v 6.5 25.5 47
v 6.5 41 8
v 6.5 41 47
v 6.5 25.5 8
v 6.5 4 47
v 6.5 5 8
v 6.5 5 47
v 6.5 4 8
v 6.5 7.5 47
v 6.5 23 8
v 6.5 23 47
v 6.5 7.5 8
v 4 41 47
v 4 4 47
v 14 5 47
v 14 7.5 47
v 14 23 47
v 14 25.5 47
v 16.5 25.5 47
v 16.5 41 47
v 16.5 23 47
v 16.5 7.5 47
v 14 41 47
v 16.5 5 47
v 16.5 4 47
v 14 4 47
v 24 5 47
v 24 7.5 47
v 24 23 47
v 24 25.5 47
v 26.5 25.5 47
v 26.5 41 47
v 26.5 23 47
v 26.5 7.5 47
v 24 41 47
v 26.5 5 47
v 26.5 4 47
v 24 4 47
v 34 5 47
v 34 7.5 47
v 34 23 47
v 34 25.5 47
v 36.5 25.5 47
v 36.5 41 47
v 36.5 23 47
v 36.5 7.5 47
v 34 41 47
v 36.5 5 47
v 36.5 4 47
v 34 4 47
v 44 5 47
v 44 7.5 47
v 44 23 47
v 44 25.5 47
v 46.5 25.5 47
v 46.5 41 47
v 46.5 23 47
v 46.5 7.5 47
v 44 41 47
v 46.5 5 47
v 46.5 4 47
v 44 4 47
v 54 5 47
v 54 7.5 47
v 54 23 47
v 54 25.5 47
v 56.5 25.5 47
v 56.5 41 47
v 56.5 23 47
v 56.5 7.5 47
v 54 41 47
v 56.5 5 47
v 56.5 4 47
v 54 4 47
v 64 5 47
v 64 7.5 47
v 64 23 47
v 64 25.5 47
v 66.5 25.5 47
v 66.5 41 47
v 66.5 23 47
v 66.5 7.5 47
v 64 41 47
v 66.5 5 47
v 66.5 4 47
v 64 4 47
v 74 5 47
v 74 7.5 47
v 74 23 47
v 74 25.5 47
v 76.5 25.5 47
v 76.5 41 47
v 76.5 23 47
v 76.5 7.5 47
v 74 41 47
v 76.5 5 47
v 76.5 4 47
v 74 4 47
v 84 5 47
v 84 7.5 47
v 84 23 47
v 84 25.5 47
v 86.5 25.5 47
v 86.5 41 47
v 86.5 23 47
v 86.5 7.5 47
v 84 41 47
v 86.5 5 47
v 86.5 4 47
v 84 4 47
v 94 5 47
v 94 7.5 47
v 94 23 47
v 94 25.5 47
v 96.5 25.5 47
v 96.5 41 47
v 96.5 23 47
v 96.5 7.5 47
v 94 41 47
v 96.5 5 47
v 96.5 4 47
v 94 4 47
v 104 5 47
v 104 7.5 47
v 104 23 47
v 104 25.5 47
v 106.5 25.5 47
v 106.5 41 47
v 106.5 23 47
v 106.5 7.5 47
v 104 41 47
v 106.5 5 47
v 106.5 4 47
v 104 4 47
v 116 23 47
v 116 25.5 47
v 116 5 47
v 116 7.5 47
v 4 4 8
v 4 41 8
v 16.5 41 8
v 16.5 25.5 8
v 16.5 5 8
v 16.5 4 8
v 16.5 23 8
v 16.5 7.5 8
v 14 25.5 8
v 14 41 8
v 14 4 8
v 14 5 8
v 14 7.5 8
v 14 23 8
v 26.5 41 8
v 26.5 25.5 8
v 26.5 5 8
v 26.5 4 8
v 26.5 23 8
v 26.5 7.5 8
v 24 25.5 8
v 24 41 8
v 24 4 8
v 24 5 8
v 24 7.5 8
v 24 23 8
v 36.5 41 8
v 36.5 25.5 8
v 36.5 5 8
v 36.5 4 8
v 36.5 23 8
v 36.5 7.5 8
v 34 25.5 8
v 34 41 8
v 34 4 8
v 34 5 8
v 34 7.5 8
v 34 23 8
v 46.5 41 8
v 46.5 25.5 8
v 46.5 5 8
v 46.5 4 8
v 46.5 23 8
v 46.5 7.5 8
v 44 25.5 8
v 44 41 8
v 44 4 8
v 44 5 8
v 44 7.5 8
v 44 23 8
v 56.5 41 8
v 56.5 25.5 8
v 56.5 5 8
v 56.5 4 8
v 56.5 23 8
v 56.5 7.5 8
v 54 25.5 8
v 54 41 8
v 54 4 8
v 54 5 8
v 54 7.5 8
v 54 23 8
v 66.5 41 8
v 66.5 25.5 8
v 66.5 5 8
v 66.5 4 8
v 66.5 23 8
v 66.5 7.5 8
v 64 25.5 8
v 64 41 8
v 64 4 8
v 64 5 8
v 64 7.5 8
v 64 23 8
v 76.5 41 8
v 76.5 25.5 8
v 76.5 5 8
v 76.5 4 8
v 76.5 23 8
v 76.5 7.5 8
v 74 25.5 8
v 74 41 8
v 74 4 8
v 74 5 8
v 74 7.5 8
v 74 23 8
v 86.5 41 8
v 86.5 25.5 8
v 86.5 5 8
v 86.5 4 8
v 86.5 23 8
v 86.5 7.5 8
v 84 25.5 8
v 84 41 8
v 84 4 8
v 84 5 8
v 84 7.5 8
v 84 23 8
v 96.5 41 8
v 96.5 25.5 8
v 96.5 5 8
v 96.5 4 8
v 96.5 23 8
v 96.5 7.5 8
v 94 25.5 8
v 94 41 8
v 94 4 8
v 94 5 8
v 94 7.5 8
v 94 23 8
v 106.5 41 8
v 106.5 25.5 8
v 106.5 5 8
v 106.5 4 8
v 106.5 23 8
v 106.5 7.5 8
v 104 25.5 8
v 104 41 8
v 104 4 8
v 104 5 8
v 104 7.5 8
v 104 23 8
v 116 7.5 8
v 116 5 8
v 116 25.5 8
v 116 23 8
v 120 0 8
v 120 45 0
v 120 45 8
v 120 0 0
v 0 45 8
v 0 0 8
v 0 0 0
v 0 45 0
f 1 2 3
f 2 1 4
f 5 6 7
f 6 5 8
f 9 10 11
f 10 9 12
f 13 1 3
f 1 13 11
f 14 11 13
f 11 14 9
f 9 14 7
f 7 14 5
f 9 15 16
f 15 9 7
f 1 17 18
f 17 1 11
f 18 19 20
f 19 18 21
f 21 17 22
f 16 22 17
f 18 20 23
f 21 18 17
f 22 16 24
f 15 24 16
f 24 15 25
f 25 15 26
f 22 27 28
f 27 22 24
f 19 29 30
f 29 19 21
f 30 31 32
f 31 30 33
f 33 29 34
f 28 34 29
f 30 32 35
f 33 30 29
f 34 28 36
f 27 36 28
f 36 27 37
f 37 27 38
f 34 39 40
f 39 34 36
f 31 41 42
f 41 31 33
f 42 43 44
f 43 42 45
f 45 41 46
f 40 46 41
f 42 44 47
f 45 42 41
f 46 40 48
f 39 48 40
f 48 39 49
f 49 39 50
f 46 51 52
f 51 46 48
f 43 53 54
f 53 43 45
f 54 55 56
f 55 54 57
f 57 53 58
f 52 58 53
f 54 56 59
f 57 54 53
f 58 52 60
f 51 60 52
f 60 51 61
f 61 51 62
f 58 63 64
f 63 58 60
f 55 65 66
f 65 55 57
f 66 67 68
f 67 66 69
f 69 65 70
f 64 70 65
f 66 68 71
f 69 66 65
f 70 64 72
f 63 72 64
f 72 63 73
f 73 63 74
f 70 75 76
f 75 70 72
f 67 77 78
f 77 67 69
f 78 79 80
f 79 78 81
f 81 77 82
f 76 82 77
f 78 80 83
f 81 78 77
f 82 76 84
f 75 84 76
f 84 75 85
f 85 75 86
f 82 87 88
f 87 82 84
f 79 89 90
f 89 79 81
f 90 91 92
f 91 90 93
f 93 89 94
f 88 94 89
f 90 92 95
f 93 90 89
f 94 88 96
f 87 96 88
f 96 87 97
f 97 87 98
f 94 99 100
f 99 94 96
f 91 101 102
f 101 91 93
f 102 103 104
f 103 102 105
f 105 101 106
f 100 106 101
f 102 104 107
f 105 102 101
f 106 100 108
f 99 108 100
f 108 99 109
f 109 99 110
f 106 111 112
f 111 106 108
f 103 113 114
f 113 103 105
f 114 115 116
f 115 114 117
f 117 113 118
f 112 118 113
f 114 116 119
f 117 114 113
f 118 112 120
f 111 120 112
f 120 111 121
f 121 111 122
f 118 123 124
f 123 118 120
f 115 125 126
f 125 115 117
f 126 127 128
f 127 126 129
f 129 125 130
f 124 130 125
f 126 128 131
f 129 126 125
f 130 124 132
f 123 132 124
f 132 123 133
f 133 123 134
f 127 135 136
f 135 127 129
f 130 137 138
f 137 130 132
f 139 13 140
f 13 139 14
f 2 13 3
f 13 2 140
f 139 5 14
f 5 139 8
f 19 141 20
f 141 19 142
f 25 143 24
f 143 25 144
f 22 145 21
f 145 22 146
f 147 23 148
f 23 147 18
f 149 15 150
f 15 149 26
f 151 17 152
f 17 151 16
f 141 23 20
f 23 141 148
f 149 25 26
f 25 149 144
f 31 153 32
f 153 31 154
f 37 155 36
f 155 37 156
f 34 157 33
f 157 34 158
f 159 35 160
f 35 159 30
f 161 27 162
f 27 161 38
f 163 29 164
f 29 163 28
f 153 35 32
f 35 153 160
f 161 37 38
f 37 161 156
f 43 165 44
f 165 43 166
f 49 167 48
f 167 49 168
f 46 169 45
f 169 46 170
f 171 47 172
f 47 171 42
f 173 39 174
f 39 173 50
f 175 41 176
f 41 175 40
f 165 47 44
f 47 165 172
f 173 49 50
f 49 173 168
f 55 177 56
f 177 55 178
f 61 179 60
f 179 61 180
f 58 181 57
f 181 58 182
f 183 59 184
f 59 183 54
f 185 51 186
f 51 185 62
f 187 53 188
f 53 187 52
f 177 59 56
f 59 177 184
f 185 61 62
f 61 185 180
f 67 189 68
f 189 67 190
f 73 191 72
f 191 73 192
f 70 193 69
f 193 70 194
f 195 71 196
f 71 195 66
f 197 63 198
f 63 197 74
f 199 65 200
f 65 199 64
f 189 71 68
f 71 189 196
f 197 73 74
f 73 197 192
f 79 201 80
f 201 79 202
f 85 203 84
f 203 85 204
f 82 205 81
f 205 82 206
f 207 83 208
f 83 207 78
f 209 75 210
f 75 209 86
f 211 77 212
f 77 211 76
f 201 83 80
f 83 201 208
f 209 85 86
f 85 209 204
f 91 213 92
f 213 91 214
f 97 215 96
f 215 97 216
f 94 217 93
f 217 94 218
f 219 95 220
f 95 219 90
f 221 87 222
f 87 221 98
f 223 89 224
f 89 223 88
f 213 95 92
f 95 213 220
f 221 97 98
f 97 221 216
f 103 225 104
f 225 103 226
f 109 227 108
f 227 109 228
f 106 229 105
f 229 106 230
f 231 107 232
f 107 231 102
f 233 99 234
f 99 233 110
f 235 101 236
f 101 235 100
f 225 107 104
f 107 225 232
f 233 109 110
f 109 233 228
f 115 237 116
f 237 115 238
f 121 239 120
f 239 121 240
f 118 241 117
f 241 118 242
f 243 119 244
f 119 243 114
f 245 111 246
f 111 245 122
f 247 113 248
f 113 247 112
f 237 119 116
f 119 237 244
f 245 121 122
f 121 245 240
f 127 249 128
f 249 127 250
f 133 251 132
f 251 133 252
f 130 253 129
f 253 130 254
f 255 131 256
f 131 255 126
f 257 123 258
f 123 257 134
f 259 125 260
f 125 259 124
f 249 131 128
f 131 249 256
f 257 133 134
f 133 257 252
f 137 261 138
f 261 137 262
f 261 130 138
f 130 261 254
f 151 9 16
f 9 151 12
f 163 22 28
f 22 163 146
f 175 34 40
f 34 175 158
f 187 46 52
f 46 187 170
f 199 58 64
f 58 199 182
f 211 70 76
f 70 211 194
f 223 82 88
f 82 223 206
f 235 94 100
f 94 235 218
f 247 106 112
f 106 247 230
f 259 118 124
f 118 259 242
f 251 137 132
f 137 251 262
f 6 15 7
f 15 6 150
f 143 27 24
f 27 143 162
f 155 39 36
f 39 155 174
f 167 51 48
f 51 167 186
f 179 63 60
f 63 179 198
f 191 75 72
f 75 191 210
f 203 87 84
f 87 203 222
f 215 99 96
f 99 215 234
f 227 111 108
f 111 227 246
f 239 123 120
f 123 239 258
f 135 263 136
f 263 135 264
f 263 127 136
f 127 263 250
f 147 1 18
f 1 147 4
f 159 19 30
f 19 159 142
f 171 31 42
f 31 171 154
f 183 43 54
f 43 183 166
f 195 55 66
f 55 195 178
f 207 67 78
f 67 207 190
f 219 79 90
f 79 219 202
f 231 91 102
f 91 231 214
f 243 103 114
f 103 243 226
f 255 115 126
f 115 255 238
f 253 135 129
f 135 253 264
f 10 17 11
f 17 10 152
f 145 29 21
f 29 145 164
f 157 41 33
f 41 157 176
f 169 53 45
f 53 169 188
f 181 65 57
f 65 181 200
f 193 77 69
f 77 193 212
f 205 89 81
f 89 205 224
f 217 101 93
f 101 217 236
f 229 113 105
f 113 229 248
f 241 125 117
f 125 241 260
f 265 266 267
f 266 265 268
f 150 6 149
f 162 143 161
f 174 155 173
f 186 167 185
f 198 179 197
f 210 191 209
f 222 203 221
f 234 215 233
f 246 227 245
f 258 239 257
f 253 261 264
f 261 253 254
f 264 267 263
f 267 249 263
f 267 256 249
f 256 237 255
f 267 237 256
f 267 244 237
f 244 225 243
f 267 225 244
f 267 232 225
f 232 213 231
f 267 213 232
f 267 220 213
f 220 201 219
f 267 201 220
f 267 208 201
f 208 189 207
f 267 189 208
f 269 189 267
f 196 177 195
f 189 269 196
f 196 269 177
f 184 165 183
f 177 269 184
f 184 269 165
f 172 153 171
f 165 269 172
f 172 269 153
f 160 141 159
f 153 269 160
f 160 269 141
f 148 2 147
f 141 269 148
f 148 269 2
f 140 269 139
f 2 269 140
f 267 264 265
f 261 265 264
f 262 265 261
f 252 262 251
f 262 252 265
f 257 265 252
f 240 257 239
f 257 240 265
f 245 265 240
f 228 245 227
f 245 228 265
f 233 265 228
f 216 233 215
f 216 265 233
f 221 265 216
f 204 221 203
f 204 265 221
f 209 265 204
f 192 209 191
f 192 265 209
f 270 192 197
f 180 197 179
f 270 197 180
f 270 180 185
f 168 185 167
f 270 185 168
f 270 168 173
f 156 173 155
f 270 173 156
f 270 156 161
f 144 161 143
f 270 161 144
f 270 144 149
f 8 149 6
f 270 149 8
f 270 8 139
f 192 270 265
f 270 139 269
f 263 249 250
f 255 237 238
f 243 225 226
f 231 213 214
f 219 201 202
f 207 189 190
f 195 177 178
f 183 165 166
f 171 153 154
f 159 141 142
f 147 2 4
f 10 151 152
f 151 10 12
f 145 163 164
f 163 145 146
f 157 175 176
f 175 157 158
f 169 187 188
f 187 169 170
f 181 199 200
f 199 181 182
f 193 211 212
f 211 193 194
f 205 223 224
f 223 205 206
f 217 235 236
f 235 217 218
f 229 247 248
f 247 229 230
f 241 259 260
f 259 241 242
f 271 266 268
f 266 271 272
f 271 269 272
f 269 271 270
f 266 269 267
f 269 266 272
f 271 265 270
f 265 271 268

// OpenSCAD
$fn = 32;

// ----------------------------------------------------------------------
// Heatsink: cross fin block
// ----------------------------------------------------------------------

// --- parameters (mm) ---
base_l = 120;             // base length, X
base_w = 45;              // base width, Y
base_t = 8;               // base plate thickness
fin_h = 40;               // fin height above the base
fin_t = 2.5;              // fin thickness
edge = 4;                 // margin from the base ends
pitch = 10;               // fin pitch
rib_pitch = 18;           // cross rib pitch

n_fins = floor((base_l - 2 * edge - fin_t) / pitch) + 1;  // fin count
total_h = base_t + fin_h - 1;  // overall height
n_ribs = floor((base_w - 2 * edge) / rib_pitch);  // rib count

union() {
  cube([base_l, base_w, base_t]);
  for (i = [0 : n_fins - 1])
    translate([edge + i * pitch, edge, base_t - 1])
      cube([fin_t, base_w - 2 * edge, fin_h]);
  for (i = [0 : n_ribs - 1])
    translate([edge, edge + 1 + i * rib_pitch, base_t - 1])
      cube([base_l - 2 * edge, fin_t, fin_h]);
}
